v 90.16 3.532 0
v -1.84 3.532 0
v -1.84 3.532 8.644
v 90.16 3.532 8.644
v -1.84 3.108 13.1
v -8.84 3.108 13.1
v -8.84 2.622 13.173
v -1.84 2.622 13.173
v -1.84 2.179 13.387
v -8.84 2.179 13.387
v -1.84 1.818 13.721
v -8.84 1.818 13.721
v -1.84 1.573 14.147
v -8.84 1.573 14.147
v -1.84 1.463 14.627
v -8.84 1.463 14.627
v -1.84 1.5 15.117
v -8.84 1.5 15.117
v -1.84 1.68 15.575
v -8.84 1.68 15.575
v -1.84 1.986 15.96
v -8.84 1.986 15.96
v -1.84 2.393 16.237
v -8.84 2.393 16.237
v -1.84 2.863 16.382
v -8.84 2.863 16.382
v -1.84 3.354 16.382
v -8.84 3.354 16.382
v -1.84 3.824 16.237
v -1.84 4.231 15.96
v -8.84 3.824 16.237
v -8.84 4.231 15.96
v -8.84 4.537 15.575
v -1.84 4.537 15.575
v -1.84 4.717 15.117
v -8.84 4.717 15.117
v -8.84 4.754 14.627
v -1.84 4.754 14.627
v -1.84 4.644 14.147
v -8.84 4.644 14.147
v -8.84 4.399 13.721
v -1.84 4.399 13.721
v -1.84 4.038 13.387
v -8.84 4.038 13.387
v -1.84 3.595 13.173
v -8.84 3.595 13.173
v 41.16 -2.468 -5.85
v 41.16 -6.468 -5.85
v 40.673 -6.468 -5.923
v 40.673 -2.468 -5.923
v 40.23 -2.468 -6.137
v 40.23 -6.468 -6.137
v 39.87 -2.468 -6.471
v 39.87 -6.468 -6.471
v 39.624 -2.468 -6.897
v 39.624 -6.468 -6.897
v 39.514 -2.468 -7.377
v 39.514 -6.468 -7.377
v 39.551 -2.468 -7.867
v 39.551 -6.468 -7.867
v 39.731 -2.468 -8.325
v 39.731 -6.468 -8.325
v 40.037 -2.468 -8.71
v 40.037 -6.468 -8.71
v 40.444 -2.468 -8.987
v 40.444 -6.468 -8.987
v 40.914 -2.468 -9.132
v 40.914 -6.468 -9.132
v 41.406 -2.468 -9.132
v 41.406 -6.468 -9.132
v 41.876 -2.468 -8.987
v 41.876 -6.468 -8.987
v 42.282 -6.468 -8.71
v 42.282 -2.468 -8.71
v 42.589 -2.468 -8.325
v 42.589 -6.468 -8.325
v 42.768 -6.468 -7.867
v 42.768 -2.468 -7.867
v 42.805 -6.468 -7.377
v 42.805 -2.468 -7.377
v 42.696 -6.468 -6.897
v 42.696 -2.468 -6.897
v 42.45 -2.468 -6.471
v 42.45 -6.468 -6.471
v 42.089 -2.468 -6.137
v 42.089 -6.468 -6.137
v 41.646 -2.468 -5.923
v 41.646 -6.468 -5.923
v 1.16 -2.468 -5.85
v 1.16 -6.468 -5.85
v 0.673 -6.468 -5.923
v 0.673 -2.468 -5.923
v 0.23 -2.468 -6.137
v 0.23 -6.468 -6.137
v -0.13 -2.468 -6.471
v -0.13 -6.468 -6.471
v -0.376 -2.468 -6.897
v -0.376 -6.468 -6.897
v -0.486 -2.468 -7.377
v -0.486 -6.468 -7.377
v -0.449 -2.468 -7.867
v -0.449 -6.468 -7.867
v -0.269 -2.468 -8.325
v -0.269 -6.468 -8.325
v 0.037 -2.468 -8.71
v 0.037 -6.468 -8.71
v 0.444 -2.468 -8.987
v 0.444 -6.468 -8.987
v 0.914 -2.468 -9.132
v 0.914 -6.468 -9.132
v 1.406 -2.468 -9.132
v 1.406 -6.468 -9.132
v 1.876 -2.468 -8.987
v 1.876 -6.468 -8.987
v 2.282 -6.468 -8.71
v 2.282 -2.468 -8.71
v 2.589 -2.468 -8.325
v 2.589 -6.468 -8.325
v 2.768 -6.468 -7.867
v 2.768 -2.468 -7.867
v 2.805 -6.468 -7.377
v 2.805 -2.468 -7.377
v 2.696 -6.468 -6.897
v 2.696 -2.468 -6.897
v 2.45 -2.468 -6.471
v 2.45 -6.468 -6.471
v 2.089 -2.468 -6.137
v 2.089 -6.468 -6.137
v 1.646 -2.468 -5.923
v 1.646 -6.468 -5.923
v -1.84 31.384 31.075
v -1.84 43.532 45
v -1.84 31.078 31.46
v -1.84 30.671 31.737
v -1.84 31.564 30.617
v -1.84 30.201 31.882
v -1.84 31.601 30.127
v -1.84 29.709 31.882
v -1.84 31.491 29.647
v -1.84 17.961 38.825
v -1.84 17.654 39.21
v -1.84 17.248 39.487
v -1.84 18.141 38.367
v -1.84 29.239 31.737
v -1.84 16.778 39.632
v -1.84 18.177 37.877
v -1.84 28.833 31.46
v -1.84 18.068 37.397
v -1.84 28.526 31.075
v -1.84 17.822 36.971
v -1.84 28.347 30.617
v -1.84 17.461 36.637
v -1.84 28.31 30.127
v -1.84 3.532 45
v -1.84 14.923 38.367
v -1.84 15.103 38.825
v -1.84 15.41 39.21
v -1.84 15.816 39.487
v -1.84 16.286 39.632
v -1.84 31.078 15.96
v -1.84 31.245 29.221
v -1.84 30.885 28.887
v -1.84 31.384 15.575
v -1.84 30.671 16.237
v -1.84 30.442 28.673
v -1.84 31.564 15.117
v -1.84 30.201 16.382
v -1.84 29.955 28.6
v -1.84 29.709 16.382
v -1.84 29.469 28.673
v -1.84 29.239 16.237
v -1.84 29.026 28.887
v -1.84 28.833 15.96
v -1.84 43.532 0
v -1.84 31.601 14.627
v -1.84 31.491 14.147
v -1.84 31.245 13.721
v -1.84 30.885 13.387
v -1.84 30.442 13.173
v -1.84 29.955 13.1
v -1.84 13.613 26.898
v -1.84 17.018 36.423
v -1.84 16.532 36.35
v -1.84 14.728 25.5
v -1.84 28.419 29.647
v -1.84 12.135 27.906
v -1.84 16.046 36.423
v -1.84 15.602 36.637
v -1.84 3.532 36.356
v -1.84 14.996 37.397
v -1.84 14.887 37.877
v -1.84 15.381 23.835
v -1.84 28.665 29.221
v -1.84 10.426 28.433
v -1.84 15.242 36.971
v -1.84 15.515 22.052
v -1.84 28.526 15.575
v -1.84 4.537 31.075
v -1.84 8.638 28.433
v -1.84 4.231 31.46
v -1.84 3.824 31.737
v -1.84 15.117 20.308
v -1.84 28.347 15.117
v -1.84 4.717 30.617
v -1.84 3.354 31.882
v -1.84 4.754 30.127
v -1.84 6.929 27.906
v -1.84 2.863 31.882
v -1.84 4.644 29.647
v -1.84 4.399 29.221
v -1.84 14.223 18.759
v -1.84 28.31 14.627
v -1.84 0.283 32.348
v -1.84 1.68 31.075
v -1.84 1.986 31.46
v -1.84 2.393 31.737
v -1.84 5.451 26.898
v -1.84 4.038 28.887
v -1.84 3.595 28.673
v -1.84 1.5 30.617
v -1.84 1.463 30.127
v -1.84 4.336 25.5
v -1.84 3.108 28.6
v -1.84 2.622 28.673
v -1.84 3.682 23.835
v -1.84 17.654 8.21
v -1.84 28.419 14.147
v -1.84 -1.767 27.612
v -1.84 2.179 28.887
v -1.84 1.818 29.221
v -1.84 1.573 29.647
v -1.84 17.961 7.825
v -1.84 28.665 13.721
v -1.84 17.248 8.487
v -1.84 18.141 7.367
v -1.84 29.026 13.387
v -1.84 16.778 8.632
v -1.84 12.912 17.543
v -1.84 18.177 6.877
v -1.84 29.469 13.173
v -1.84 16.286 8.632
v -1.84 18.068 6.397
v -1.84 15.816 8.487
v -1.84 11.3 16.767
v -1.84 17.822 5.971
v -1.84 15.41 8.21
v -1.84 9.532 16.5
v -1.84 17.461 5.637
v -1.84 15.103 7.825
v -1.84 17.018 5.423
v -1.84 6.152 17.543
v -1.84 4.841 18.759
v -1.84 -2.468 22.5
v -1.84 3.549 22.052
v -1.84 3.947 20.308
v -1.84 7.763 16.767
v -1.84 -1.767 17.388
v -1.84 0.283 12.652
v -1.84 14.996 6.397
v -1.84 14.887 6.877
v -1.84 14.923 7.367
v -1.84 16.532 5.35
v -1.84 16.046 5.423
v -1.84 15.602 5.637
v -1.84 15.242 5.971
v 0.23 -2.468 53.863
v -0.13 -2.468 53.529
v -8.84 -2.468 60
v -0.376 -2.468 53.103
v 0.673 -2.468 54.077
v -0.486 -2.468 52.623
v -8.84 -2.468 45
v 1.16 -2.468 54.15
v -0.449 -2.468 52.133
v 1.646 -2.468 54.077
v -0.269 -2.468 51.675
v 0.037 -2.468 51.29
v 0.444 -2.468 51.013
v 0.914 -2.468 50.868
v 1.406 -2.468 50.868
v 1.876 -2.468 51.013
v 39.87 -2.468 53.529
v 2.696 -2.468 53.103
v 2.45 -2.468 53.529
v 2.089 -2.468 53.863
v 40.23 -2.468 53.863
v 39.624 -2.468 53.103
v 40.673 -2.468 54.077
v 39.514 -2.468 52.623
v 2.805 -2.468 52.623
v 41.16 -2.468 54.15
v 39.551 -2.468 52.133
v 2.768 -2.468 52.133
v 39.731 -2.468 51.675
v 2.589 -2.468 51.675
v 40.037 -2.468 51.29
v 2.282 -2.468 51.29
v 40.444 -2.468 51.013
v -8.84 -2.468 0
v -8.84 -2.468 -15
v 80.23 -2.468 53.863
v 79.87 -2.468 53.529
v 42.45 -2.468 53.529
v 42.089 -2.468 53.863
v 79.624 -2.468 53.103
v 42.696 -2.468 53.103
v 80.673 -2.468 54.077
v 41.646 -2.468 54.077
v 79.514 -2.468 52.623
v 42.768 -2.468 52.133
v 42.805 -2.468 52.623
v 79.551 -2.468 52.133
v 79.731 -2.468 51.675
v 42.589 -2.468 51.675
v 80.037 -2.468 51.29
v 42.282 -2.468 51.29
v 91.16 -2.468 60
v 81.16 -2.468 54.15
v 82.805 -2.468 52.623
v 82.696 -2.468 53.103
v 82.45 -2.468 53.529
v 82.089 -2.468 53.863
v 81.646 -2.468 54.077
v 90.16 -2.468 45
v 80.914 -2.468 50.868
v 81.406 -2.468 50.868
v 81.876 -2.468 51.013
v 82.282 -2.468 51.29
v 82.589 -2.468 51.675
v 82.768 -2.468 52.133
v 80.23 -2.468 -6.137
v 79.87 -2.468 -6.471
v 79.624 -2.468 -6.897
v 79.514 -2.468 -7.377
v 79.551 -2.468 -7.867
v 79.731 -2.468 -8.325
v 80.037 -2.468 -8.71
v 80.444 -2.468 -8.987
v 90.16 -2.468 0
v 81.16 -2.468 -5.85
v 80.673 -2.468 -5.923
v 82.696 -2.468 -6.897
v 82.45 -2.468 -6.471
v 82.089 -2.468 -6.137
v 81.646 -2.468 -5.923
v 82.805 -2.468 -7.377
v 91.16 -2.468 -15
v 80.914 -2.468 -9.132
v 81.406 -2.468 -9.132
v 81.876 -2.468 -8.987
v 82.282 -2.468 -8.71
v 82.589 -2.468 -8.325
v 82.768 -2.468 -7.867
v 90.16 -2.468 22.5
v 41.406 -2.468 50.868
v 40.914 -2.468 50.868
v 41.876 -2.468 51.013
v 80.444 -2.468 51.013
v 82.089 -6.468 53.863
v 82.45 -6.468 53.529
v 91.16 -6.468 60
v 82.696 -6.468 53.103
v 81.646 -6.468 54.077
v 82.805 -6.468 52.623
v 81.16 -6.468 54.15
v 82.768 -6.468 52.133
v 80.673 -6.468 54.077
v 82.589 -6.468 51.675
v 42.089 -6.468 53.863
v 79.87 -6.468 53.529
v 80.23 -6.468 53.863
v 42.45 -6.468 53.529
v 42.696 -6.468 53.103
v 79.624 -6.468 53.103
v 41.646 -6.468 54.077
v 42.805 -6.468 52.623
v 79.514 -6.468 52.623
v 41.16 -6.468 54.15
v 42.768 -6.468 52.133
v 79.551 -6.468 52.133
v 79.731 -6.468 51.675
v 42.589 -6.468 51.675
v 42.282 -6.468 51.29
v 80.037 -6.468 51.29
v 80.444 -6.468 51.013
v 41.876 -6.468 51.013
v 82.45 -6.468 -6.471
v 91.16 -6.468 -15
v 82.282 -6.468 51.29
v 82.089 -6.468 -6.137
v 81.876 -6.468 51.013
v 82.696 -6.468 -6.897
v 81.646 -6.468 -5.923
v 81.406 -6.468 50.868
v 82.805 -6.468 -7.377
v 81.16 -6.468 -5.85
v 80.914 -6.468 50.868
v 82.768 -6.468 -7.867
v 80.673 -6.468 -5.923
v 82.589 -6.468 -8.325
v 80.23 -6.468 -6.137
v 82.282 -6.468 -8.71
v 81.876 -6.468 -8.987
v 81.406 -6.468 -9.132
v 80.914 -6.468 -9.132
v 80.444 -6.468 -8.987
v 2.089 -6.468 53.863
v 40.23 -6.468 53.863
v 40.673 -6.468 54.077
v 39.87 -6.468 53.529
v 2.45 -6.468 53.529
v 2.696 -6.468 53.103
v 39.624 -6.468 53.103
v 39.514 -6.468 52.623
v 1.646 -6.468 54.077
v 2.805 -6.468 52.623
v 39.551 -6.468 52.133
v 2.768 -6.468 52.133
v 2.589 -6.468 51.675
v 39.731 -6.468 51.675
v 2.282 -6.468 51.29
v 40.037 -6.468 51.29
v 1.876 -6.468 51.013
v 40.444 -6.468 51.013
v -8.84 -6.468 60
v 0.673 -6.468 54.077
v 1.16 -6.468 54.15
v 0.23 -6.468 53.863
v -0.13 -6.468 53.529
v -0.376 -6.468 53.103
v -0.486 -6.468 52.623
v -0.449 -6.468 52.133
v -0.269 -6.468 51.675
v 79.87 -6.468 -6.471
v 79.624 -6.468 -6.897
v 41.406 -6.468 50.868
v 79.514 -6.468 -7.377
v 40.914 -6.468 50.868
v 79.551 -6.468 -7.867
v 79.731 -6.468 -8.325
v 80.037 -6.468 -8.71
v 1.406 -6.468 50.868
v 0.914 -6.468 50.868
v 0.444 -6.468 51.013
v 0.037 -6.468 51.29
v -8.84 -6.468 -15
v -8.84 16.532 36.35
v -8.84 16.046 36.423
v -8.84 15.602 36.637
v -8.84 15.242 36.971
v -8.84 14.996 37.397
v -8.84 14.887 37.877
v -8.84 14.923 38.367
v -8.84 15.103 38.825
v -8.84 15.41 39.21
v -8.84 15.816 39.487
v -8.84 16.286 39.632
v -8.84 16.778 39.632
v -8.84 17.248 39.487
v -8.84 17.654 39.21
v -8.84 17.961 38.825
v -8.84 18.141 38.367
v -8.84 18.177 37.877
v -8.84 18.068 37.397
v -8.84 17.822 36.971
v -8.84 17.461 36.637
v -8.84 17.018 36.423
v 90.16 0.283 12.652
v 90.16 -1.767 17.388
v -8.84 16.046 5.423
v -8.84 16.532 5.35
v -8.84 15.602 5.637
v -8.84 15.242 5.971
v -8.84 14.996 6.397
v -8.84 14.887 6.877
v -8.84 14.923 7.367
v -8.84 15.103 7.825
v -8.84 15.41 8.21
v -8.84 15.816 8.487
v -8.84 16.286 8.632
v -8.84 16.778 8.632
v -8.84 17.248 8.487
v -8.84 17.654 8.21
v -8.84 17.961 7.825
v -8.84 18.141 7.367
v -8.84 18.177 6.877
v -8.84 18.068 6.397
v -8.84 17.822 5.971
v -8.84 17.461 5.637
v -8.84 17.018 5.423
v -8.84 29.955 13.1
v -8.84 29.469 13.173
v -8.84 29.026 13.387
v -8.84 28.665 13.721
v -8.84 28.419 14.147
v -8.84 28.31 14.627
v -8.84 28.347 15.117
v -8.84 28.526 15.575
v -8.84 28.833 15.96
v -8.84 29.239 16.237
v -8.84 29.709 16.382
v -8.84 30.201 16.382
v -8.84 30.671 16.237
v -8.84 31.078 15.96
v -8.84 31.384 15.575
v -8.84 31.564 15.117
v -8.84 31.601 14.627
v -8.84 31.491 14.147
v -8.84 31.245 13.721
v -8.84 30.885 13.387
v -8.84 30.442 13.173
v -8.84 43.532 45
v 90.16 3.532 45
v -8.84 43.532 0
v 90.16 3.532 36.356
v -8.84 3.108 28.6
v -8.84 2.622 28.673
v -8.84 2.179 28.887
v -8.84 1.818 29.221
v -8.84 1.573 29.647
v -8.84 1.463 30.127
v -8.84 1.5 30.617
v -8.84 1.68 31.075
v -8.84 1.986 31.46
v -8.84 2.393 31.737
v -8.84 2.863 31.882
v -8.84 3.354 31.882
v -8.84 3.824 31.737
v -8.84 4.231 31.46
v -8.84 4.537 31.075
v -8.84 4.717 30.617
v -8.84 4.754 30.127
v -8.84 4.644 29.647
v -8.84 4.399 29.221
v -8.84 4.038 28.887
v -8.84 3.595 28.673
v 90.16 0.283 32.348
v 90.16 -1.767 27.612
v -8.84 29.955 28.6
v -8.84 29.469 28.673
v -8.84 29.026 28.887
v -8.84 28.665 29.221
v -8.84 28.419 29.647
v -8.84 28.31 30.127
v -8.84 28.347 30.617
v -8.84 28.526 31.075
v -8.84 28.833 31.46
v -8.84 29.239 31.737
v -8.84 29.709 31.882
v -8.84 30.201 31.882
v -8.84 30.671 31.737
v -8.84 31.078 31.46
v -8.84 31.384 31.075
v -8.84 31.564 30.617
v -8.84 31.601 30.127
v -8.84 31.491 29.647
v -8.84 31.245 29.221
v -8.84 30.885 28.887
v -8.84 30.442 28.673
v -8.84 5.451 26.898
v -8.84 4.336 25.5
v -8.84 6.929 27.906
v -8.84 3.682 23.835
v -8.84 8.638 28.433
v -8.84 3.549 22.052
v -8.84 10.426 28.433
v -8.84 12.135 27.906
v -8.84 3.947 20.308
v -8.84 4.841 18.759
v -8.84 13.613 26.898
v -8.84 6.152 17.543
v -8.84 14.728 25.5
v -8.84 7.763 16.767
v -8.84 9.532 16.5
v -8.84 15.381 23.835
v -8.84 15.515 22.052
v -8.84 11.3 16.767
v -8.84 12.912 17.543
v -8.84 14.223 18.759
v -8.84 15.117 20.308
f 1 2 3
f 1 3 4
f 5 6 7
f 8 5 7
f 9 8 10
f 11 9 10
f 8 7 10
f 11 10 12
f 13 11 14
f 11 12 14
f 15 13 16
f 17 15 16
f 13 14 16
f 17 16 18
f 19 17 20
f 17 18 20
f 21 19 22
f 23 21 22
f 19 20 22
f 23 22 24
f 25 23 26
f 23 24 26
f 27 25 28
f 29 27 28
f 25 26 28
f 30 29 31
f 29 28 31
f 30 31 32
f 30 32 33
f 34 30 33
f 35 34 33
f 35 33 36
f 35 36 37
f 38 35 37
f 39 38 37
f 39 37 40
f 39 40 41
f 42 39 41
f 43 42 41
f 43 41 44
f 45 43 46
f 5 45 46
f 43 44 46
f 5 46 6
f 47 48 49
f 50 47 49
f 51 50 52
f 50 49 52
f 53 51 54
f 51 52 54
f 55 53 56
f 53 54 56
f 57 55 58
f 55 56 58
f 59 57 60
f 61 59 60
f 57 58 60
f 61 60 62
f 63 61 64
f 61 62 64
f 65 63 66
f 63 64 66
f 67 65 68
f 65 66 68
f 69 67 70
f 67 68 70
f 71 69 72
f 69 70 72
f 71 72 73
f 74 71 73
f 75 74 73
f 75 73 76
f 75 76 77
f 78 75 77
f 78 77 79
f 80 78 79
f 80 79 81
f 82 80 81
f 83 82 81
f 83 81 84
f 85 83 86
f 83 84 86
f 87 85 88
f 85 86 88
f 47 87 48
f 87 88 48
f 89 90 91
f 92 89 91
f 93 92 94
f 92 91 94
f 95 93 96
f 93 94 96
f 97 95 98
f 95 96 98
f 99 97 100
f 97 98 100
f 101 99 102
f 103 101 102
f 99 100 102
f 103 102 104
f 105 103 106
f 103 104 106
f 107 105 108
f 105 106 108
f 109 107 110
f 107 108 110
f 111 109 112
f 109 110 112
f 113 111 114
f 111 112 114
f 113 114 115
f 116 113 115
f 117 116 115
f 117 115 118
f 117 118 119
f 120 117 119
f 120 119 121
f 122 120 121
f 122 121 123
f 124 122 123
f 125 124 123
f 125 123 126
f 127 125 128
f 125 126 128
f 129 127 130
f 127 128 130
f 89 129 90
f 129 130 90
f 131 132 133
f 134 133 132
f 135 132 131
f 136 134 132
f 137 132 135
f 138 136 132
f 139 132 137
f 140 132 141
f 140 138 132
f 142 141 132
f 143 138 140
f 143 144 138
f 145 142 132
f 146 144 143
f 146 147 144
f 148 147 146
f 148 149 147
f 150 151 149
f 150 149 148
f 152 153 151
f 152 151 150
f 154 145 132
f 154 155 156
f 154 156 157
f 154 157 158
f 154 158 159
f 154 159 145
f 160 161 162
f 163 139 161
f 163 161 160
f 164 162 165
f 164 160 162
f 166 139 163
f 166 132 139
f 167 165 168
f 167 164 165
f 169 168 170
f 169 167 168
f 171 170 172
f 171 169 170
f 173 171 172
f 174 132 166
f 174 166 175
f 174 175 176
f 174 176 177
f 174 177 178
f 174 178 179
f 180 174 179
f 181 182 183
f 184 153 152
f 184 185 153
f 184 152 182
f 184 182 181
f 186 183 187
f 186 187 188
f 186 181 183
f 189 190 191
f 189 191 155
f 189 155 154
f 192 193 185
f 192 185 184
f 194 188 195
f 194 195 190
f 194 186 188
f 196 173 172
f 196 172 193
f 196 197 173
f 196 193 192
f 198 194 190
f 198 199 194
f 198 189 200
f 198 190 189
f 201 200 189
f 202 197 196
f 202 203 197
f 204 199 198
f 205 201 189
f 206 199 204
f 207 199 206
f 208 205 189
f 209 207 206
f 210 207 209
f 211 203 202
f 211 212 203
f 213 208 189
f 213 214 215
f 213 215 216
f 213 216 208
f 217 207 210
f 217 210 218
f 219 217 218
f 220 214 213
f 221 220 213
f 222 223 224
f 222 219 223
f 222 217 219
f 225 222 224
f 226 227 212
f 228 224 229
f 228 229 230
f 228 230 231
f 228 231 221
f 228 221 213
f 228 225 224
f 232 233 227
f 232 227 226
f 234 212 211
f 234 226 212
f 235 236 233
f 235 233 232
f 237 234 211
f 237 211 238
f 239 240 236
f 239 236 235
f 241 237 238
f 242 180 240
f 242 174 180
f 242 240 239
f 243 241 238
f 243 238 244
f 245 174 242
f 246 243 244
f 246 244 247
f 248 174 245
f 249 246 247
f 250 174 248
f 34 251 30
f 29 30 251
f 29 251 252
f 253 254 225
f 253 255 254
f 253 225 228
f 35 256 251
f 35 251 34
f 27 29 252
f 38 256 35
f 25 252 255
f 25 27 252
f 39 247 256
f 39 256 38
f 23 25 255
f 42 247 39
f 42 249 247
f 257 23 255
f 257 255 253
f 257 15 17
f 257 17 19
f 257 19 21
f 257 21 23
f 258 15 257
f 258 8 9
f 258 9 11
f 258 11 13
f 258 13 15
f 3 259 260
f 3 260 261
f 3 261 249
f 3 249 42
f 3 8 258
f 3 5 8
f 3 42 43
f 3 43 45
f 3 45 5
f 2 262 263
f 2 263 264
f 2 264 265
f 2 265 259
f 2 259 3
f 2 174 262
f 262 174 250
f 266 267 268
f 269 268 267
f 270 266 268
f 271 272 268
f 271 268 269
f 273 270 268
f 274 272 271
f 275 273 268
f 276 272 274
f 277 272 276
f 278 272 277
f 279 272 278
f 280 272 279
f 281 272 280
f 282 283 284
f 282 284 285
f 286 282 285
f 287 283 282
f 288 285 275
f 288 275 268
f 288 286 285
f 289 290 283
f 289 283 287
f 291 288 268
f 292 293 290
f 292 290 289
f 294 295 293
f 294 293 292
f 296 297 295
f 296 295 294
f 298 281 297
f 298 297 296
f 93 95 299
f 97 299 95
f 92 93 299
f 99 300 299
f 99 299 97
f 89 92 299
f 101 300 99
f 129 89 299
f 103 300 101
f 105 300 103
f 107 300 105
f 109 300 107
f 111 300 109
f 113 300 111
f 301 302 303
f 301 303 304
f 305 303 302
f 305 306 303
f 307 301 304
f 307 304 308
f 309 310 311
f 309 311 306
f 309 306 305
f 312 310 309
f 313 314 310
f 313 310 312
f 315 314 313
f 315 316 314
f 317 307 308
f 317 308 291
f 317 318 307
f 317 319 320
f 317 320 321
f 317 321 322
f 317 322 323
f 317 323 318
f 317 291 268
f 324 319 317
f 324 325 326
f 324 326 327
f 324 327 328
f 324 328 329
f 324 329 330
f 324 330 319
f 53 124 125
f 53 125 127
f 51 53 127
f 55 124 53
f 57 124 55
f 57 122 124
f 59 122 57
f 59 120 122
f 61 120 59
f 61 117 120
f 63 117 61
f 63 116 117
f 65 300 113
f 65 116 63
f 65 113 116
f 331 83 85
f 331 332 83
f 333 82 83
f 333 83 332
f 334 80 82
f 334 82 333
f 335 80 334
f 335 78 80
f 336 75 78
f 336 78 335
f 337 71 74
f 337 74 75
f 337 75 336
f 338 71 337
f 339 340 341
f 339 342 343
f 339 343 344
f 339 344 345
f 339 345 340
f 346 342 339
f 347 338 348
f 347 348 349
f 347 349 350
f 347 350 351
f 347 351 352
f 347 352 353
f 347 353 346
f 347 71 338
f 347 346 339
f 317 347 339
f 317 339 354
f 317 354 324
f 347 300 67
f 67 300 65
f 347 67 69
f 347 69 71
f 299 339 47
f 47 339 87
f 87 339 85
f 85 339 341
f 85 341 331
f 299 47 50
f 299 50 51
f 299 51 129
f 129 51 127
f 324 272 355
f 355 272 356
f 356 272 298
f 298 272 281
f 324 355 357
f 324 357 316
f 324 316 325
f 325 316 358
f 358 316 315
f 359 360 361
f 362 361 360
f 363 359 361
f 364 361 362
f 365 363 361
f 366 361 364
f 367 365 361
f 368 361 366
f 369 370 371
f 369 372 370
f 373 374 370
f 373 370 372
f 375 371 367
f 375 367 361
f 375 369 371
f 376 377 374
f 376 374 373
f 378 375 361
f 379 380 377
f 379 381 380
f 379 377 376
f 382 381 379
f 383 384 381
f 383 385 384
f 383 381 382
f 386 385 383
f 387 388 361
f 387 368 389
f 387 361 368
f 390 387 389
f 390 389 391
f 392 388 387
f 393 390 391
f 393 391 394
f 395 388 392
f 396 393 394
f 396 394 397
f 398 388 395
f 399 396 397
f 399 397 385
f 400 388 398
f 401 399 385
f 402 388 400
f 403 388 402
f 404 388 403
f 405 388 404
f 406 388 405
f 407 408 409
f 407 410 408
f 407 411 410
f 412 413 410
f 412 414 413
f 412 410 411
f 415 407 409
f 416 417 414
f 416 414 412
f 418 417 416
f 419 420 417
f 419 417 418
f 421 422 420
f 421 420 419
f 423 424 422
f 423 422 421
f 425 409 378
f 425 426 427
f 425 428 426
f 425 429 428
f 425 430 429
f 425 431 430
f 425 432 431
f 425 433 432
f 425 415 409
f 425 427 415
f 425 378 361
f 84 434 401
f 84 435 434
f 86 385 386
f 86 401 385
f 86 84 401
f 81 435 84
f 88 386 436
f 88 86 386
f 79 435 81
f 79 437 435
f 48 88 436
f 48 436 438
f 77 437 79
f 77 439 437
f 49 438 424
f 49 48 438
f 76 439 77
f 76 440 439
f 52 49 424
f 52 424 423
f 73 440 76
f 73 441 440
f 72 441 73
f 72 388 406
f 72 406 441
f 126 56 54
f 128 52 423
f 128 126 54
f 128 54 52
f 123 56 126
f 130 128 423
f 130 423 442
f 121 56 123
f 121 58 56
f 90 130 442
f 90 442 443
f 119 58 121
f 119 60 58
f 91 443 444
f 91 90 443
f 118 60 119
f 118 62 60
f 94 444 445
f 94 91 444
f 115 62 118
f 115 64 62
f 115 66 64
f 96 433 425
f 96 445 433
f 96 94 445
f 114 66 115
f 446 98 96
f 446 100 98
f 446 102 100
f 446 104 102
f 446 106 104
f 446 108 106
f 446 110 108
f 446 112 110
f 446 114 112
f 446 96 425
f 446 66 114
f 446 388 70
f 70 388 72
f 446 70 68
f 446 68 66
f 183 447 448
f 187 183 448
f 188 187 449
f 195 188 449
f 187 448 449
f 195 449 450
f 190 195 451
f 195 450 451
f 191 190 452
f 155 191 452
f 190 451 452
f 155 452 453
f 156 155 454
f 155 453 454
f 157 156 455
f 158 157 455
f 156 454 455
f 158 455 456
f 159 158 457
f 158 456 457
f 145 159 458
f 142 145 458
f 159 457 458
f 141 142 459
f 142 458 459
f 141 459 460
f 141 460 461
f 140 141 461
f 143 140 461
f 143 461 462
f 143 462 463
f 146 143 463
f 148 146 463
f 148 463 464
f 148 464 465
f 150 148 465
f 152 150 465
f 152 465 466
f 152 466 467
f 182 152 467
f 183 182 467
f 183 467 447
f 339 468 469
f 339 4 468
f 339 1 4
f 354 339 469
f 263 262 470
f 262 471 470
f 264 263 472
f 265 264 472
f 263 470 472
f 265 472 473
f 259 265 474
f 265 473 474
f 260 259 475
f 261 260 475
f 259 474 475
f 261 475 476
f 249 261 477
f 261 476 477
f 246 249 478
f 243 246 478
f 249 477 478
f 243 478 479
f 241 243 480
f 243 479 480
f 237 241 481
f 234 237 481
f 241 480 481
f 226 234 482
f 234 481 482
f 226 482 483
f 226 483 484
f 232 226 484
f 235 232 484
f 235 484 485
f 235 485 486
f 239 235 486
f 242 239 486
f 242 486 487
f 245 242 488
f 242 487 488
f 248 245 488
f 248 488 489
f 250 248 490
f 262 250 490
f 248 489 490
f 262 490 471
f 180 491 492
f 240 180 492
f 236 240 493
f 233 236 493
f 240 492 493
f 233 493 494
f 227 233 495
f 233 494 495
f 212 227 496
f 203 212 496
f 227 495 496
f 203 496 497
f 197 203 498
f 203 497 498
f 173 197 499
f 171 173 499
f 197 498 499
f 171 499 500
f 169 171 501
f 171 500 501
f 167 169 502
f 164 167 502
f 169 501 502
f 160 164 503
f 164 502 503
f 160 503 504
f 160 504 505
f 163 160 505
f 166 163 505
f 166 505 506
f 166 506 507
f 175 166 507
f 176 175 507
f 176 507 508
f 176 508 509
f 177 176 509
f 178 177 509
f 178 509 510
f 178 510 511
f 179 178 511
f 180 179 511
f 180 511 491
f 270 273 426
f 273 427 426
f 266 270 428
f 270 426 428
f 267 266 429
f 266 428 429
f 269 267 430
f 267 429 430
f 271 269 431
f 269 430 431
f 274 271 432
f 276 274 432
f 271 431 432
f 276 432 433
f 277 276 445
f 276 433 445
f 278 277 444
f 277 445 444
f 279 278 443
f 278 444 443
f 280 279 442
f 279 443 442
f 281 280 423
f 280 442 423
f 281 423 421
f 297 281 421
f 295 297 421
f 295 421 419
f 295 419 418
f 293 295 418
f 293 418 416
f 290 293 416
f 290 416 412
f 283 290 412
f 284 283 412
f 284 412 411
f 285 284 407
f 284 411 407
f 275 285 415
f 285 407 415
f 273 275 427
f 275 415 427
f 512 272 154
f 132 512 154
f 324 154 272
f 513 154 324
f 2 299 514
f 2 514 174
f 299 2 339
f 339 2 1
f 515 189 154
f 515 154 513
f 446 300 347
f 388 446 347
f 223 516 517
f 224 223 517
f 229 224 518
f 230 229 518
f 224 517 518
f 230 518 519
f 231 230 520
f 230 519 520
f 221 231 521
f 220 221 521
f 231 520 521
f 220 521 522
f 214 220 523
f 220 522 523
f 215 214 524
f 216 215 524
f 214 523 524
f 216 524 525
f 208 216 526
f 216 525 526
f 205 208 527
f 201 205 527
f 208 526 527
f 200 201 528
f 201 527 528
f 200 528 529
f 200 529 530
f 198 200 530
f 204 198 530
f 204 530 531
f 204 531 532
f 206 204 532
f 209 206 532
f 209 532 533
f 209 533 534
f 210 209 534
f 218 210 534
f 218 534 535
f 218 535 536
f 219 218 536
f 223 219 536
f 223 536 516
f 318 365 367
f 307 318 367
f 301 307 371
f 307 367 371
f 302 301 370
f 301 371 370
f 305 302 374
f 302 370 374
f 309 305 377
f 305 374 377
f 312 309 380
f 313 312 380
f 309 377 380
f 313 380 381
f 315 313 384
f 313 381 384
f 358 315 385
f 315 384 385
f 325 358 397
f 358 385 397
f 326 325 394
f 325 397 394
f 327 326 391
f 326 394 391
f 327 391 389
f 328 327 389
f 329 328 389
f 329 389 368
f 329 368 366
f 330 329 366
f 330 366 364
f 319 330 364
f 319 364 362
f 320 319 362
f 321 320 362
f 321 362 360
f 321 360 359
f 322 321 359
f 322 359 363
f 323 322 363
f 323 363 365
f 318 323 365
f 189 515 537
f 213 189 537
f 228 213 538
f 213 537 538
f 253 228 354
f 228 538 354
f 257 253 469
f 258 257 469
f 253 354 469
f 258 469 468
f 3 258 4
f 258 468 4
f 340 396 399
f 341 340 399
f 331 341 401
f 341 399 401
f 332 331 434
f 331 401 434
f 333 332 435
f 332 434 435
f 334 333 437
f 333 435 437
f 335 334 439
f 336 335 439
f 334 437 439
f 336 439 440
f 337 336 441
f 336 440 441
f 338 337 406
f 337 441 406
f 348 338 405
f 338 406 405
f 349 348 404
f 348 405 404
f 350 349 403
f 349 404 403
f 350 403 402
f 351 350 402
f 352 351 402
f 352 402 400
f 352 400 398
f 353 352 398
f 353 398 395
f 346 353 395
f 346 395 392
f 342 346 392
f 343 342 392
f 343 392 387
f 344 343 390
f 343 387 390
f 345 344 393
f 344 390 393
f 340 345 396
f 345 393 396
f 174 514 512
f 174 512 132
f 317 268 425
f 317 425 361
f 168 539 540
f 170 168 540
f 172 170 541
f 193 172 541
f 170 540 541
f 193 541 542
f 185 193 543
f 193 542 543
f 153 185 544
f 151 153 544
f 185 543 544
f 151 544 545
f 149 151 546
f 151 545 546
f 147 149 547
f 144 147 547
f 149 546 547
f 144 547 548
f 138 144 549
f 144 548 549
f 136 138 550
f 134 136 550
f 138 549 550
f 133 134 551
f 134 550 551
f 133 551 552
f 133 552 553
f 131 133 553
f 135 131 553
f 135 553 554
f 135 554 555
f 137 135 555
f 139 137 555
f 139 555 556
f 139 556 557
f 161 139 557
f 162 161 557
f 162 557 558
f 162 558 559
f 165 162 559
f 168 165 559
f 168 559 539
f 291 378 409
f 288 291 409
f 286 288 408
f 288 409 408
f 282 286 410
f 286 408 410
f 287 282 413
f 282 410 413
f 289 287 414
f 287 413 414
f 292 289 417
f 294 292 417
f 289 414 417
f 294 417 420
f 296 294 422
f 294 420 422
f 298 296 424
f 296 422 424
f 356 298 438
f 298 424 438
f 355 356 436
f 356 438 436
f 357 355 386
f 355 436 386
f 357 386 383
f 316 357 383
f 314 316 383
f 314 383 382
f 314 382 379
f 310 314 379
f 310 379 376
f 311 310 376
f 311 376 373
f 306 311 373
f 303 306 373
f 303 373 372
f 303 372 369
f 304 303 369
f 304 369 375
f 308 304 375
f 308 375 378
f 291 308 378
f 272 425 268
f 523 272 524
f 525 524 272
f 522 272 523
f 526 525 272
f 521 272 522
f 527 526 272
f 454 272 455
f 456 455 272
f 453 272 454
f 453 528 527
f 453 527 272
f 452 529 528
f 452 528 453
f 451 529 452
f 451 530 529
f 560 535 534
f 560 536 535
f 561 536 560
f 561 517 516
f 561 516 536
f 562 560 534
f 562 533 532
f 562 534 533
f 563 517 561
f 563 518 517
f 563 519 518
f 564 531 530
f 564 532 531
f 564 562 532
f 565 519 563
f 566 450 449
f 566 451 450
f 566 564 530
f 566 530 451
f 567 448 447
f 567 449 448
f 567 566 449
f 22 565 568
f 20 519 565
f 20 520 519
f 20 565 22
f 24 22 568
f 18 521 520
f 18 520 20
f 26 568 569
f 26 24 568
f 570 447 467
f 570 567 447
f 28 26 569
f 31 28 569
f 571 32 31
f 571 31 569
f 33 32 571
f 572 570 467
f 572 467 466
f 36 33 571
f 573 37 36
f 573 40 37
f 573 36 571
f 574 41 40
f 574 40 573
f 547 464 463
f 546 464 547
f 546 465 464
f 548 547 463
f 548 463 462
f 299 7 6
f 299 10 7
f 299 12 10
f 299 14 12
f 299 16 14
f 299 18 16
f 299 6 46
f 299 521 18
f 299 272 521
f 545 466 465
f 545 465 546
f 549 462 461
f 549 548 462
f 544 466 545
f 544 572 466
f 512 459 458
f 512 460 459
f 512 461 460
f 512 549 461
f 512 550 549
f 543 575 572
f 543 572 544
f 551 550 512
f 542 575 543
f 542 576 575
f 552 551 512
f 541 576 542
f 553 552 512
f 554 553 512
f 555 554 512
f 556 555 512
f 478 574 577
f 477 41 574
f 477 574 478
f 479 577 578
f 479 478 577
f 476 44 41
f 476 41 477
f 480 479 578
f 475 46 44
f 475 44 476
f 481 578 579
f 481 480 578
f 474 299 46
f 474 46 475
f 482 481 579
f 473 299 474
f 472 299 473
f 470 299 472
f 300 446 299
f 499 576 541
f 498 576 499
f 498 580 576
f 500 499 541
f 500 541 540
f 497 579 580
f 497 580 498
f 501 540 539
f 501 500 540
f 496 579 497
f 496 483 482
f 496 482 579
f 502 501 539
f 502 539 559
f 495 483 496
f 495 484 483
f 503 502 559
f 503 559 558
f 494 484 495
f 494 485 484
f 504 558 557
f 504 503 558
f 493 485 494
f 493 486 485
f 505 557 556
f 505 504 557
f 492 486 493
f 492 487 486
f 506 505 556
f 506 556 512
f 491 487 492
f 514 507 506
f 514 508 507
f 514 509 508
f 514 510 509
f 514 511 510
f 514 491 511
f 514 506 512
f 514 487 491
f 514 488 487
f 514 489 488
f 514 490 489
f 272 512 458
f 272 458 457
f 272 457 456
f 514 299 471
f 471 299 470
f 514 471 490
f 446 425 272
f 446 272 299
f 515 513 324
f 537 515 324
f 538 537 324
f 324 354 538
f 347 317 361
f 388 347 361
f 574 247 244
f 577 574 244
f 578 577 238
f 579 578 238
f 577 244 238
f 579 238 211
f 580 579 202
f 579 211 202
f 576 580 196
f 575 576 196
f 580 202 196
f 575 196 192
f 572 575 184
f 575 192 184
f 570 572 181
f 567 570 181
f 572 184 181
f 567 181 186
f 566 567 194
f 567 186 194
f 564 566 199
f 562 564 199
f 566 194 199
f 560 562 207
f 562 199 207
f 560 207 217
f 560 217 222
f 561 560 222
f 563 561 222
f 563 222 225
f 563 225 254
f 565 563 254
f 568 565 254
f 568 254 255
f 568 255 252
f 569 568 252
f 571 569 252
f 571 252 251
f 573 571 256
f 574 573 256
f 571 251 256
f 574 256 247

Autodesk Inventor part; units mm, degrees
ref_plane "YZ Plane" through (0, 0, 0) normal (1, 0, 0) x (0, 1, 0)
ref_plane "XZ Plane" through (0, 0, 0) normal (0, 1, 0) x (-1, 0, 0)
ref_plane "XY Plane" through (0, 0, 0) normal (0, 0, 1) x (1, 0, 0)
sketch "Sketch1" plane through (0, 0, 0) normal (0, 0, 1) x (1, 0, 0)
  line L0 (-8.8404, 43.5319) -> (-1.8404, 43.5319)
  line L1 (-1.8404, 43.5319) -> (-1.8404, 3.5319)
  line L2 (-1.8404, 3.5319) -> (90.1596, 3.5319)
  line L3 (90.1596, 3.5319) -> (90.1596, -6.4681)
  line L4 (90.1596, -6.4681) -> (-8.8404, -6.4681)
  line L5 (-8.8404, -6.4681) -> (-8.8404, 43.5319)
  point P0 (0, 0)
  dimension "d0" = 10
  dimension "d1" = 50
  dimension "d2" = 7
  dimension "d4" = 92
extrude "Extrusion1" add sketch "Sketch1" along normal blind 45
sketch "Sketch3" plane through (90.1596, -6.4681, 0) normal (1, 0, 0) x (0, 0, -1)
  circle A0 centre (-22.5, 23) radius 19
  line L0 (0, 0) -> (-45, 0) projected
  line L1 (-45, 0) -> (-45, 10) projected
  point P0 (0, 6.4681)
  dimension "d7" = 38
  dimension "d8" = 23
  dimension "d9" = 22.5
extrude "Extrusion2" cut sketch "Sketch3" against normal up to surface (92 mm away)
sketch "Sketch4" plane through (-1.8404, 3.5319, 0) normal (1, 0, 0) x (0, 0, -1)
  arc A0 (-36.3564, 0) -> (-8.6436, 0) centre (-22.5, 13) ccw projected
  circle A1 centre (-22.5, 13) radius 19
  circle A2 centre (-22.5, 6) radius 3.25
  line L0 (0, -10) -> (0, 0) projected
  circle A3 centre (-22.5, 13) radius 15.5
  circle A4 centre (-38, 13) radius 2.166
  circle A5 centre (-30.25, 26.4234) radius 2.1809
  circle A6 centre (-14.75, 26.4234) radius 2.0998
  circle A7 centre (-7, 13) radius 1.7963
  circle A8 centre (-14.75, -0.4234) radius 2.628
  circle A9 centre (-30.25, -0.4234) radius 2.0573
  line L1 (-38, 13) -> (-22.5, 13)
  line L2 (-22.5, 13) -> (-7, 13)
  line L3 (-14.75, 26.4234) -> (-22.5, 13)
  line L4 (-14.75, -0.4234) -> (-22.5, 13)
  line L5 (-30.25, -0.4234) -> (-22.5, 13)
  line L6 (-30.25, 26.4234) -> (-22.5, 13)
  point P0 (0, -3.5319)
  dimension "d12" = 38
  dimension "d13" = 7
  dimension "d14" = 6.5
  dimension "d15" = 22.5
  dimension "d16" = 31
  dimension "d17" = 60
  dimension "d18" = 60
  dimension "d19" = 60
  dimension "d20" = 60
hole "Hole1" at (-1.8404, 29.9553, 30.25) at (-1.8404, 29.9553, 14.75) at (-1.8404, 16.5319, 7) at (-1.8404, 3.1085, 14.75) at (-1.8404, 3.1085, 30.25) at (-1.8404, 16.5319, 38) direction (-1, 0, 0) diameter 3.3 end through all
sketch "Sketch5" plane through (-1.8404, 3.5319, 0) normal (1, 0, 0) x (0, 0, -1)
  point P0 (0, -3.5319)
sketch "Sketch6" plane through (-1.8404, 3.5319, 0) normal (1, 0, 0) x (0, 0, -1)
  circle A0 centre (-22.5, 6) radius 6
  line L0 (-45, 0) -> (-45, 40) projected
  arc A1 (-36.3564, 0) -> (-8.6436, 0) centre (-22.5, 13) ccw projected
  circle A2 centre (-22.5, 13) radius 19
  point P0 (0, -3.5319)
  dimension "d28" = 12
  dimension "d29" = 22.5
  dimension "d30" = 7
extrude "Extrusion3" cut sketch "Sketch6" against normal up to surface (7 mm away) contours A0
sketch "Sketch7" plane through (0, 0, 45) normal (0, 0, 1) x (1, 0, 0)
  line L0 (-8.8404, 43.5319) -> (-8.8404, -6.4681) projected
  line L1 (91.1596, -6.4681) -> (-8.8404, -6.4681)
  line L2 (-8.8404, -6.4681) -> (-8.8404, -2.4681)
  line L3 (-8.8404, -2.4681) -> (91.1596, -2.4681)
  line L4 (91.1596, -2.4681) -> (91.1596, -6.4681)
  point P0 (90.1596, 3.5319)
  dimension "d33" = 4
  dimension "d55" = 100
extrude "Extrusion4" add sketch "Sketch7" along normal blind 15 and the other way blind 60
sketch "Sketch8" plane through (-8.8404, -2.4681, 0) normal (0, 1, 0) x (1, 0, 0)
  circle A0 centre (10, 7.5) radius 4.4582
  circle A1 centre (90, 7.5) radius 4.9921
  circle A2 centre (10, -52.5) radius 4.3054
  circle A3 centre (90, -52.5) radius 4.5947
  line L0 (0, 15) -> (100, 15) projected
  line L1 (0, 15) -> (0, 0) projected
  line L2 (100, 15) -> (100, -60) projected
  line L3 (100, 15) -> (100, -60) projected
  line L4 (100, -60) -> (0, -60) projected
  line L5 (0, -45) -> (0, -60) projected
  circle A4 centre (50, -52.5) radius 3.4509
  circle A5 centre (50, 7.5) radius 3.4509
  point P0 (8.8404, 0)
  point P1 (99, 0)
  point P2 (99, -45)
  dimension "d38" = 7.5
  dimension "d39" = 10
  dimension "d40" = 10
  dimension "d41" = 7.5
  dimension "d42" = 10
  dimension "d43" = 7.5
  dimension "d44" = 10
  dimension "d45" = 7.5
  dimension "d53" = 50
  dimension "d54" = 50
hole "Hole2" at (1.1596, -2.4681, -7.5) at (81.1596, -2.4681, -7.5) at (81.1596, -2.4681, 52.5) at (1.1596, -2.4681, 52.5) at (41.1596, -2.4681, 52.5) at (41.1596, -2.4681, -7.5) direction (0, -1, 0) diameter 3.3 end through all
properties part number "Support_moteur"
